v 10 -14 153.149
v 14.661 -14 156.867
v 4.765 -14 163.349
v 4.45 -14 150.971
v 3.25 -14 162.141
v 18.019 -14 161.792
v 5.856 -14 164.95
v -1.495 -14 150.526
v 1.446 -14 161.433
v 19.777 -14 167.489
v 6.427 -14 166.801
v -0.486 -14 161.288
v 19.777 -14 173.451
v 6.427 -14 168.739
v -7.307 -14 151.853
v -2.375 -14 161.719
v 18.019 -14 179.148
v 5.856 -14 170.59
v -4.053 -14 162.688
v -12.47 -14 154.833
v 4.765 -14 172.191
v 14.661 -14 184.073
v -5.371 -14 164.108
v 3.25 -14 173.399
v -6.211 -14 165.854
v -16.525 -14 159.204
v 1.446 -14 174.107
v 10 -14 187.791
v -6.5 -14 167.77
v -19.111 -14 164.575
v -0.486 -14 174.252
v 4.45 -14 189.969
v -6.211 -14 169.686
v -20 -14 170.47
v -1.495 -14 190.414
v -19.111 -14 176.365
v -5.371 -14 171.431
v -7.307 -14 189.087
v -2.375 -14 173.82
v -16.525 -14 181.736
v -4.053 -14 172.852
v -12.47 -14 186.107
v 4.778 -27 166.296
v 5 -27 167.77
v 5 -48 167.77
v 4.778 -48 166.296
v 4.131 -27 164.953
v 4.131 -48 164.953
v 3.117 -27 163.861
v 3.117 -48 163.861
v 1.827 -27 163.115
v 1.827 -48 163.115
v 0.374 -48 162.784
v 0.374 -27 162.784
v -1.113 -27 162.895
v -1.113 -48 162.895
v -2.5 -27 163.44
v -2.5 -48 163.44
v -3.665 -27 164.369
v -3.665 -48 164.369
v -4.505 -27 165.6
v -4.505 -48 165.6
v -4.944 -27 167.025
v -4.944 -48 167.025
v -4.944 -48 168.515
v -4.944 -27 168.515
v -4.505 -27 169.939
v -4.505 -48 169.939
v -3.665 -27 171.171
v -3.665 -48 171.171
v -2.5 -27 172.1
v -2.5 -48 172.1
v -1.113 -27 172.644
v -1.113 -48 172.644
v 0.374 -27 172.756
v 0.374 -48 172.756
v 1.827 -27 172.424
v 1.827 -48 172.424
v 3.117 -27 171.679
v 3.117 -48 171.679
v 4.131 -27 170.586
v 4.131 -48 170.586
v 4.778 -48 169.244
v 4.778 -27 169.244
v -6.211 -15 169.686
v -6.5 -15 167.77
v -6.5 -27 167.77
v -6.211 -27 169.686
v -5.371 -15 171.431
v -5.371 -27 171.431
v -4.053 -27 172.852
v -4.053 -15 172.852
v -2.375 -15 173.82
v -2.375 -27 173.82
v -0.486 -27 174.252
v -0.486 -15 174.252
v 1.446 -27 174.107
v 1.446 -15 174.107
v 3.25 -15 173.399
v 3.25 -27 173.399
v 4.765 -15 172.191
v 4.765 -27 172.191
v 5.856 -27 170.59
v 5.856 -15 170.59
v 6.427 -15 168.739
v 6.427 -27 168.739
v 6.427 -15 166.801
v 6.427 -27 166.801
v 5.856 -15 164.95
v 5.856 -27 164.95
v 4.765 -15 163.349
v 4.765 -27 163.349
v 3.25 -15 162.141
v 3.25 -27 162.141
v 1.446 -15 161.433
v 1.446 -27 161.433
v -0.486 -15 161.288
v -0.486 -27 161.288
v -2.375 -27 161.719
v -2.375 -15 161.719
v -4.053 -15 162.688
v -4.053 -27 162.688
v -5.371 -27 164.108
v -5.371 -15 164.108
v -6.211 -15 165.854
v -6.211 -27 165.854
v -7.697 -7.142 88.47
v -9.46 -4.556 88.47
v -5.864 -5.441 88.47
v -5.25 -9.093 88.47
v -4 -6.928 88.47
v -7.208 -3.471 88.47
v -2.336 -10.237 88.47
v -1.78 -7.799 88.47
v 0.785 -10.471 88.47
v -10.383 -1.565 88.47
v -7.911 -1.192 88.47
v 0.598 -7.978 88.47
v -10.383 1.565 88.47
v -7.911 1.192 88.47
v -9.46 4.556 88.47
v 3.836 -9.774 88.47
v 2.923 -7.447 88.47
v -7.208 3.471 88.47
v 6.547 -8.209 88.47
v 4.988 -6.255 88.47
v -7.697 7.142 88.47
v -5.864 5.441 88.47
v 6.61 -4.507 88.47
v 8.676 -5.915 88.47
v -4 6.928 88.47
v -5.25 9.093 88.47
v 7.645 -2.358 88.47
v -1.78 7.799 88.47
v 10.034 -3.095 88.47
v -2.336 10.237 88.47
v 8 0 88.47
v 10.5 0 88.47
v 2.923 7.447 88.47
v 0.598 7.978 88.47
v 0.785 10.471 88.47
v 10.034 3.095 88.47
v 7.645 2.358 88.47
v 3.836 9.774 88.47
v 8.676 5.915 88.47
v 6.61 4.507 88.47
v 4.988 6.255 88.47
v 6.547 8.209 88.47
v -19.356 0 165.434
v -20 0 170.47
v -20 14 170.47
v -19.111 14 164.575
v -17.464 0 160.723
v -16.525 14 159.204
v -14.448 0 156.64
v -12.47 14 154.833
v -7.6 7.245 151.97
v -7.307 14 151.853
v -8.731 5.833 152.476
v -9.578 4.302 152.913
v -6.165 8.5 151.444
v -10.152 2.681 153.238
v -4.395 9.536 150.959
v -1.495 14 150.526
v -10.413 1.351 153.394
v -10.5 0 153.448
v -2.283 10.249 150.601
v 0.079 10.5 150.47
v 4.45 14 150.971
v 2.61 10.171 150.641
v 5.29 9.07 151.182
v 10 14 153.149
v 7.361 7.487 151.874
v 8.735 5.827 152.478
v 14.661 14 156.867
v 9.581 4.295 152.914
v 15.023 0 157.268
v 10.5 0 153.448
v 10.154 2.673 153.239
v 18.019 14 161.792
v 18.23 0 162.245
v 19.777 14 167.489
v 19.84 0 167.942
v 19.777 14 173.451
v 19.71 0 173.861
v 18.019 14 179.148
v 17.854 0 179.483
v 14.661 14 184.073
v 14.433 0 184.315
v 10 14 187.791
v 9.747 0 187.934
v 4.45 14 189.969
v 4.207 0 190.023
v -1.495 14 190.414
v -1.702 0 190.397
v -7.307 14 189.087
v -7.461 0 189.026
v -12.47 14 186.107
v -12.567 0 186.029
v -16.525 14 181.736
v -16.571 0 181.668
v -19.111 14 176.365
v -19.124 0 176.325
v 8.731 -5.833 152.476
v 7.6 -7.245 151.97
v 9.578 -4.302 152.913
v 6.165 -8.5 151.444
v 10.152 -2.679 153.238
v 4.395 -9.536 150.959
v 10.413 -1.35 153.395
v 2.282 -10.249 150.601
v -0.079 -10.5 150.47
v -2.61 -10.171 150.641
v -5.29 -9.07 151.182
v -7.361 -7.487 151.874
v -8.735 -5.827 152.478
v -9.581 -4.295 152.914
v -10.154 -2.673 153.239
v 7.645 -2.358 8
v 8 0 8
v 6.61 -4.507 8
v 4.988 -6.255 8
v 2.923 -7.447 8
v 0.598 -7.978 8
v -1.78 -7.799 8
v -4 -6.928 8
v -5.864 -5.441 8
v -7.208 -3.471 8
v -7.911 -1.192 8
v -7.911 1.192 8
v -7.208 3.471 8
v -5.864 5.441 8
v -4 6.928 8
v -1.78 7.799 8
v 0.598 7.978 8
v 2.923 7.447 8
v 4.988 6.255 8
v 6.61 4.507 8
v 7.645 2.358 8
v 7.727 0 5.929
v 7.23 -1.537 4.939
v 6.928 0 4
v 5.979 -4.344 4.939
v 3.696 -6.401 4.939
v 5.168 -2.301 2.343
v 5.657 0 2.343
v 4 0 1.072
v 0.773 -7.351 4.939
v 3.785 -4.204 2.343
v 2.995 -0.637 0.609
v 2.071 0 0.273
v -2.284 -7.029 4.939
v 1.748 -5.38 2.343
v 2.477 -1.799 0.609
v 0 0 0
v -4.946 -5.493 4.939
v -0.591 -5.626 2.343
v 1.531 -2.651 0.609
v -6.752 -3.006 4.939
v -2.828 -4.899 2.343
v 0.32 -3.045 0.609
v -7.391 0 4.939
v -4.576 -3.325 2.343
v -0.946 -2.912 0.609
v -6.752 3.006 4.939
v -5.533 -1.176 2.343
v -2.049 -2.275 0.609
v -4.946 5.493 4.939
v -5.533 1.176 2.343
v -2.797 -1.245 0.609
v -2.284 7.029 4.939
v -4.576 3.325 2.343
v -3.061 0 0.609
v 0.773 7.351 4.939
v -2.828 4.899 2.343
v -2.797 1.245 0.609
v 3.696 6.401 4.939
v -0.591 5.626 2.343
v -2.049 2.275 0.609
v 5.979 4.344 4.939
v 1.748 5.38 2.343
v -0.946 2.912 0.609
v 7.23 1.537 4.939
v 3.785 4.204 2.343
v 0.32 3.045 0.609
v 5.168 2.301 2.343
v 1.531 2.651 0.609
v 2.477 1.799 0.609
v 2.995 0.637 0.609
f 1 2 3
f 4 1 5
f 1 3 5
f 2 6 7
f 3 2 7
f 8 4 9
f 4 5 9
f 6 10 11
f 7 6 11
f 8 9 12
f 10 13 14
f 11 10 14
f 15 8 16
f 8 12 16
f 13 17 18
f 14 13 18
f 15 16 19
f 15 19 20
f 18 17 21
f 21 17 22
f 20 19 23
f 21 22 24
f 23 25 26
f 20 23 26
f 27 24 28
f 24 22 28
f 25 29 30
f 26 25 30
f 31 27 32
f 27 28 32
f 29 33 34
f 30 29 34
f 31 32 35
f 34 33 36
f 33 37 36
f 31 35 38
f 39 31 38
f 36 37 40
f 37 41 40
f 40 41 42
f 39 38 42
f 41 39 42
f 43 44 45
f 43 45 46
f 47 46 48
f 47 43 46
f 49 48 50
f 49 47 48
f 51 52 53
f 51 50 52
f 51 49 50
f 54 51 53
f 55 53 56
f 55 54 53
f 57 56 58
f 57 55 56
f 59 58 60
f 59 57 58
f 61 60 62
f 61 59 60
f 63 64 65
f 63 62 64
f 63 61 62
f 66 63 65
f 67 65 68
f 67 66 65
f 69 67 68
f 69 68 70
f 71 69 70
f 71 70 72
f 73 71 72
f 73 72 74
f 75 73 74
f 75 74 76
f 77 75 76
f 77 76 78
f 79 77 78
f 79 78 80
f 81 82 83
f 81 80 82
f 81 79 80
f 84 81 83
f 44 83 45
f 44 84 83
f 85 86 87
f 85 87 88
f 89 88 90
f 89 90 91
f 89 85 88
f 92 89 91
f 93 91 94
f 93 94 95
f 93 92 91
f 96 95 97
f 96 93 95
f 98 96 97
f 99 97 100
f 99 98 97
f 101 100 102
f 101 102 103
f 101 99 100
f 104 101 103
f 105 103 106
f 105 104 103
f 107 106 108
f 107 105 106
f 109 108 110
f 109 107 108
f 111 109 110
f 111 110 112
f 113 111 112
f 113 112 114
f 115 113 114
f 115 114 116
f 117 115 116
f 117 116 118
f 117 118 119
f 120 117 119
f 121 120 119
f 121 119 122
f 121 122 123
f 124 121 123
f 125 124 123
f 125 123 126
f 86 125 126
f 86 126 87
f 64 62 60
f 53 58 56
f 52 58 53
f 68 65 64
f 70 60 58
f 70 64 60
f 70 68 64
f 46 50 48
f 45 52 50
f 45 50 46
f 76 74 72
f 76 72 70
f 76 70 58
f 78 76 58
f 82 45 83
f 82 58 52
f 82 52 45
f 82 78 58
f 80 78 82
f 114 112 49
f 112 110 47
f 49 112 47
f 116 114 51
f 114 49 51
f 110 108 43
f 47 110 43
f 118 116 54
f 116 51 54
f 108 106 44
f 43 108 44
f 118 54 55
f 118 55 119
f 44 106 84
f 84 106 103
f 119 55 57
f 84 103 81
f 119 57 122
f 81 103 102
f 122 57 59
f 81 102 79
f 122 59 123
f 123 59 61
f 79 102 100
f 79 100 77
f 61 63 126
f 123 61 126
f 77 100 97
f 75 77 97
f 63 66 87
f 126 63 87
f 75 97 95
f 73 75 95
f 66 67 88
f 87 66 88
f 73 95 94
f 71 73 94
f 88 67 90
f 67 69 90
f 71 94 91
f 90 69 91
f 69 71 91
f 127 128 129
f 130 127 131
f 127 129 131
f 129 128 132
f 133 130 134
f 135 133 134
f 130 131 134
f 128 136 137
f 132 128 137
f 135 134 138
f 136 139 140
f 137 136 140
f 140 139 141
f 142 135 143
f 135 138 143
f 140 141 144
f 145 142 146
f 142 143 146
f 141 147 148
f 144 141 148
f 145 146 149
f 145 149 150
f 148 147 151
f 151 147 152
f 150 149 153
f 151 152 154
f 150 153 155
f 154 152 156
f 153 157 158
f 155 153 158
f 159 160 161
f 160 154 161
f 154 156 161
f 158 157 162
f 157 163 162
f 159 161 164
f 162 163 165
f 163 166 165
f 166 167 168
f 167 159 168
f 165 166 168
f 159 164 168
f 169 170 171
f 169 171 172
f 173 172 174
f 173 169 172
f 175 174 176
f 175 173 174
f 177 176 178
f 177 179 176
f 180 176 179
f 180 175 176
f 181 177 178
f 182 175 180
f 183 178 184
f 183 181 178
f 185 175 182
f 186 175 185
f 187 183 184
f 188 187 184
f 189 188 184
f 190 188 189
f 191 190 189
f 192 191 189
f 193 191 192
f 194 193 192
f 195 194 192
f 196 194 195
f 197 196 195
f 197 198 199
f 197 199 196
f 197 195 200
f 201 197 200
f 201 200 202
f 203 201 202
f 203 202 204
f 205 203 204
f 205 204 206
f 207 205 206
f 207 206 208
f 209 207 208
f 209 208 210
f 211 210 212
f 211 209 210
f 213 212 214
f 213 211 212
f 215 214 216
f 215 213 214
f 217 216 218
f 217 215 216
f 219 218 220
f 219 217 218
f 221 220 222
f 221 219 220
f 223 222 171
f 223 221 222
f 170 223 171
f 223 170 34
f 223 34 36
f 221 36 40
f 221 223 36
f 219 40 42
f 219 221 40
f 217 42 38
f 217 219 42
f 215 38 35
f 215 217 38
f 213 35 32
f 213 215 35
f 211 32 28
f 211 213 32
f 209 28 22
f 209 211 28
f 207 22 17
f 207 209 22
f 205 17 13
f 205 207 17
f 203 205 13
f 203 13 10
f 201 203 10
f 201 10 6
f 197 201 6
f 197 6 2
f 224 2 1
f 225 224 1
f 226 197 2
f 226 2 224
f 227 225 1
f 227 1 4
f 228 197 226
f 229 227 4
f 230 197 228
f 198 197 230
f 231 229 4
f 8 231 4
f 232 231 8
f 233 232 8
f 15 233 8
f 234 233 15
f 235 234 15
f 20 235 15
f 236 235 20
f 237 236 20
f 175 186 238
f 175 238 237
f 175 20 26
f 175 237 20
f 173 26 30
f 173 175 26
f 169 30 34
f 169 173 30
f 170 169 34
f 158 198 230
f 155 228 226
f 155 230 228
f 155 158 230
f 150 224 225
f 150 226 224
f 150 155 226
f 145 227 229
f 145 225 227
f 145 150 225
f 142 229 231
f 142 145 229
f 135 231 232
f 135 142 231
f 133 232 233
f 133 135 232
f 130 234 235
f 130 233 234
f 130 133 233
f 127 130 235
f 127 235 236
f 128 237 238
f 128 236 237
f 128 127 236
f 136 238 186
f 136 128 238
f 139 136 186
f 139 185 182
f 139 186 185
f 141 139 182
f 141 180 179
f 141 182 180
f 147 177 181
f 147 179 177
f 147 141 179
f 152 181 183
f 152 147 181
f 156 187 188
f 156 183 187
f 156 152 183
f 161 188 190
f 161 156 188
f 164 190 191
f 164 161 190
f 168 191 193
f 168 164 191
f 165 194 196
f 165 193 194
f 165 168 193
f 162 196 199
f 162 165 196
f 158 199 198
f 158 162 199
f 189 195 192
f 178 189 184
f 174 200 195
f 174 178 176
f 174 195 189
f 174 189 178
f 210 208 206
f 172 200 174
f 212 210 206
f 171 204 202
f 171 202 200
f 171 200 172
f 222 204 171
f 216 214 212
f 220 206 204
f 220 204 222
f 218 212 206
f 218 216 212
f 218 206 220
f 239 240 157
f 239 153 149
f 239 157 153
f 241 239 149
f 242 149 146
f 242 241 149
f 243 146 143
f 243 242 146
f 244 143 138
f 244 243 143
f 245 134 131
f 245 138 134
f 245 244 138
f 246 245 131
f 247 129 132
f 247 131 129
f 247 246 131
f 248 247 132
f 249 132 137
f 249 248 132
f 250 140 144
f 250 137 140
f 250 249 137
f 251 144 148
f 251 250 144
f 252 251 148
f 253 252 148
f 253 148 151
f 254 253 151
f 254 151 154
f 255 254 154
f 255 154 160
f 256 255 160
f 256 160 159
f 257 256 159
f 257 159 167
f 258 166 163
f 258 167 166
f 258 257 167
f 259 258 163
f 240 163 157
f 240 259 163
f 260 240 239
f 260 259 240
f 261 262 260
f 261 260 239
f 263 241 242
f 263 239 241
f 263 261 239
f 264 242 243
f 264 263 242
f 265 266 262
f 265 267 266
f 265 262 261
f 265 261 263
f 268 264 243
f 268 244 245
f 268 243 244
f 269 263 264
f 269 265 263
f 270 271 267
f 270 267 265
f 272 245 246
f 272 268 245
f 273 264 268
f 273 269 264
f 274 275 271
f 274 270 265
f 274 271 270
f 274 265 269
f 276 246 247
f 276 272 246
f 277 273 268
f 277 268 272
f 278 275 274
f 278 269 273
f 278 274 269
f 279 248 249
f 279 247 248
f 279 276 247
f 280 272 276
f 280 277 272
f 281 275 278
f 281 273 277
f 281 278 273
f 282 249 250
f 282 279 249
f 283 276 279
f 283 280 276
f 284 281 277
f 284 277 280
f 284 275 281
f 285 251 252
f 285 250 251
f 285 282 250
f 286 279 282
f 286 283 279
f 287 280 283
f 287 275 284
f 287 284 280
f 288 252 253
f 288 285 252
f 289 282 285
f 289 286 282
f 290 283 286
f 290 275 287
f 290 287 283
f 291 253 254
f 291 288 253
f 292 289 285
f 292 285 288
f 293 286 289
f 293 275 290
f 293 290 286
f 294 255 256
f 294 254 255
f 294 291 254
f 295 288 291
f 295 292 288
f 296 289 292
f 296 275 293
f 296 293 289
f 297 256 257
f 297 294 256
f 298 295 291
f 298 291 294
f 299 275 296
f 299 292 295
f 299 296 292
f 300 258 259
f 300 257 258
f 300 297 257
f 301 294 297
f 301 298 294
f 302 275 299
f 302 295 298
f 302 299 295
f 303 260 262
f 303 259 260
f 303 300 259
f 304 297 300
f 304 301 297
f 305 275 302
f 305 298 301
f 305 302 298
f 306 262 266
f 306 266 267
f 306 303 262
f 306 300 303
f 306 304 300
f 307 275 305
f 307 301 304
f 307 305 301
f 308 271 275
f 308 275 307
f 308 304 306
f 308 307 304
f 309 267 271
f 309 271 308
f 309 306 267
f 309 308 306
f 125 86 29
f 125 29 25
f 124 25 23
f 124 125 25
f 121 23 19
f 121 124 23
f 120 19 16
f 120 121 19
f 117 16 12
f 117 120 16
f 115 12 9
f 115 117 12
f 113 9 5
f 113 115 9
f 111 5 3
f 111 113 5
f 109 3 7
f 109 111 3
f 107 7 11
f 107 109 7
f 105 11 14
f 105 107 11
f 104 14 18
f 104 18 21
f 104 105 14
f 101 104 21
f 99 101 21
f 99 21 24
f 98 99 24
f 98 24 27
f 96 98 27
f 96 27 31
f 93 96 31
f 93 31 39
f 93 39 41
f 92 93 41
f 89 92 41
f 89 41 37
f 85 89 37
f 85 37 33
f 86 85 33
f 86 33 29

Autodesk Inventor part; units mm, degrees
ref_plane "YZ Plane" through (0, 0, 0) normal (1, 0, 0) x (0, 1, 0)
sketch "スケッチ1" plane through (0, 0, 0) normal (0, 0, 1) x (1, 0, 0)
  circle A0 centre (0, 0) radius 8
  dimension "d0" = 16
extrude "押し出し1" add sketch "スケッチ1" along normal blind 88.47
sketch "スケッチ2" plane through (0, 0, 0) normal (0, 0, -1) x (-1, 0, 0)
  point P0 (0, 0)
  point P1 (0, 0)
sketch "スケッチ3" plane through (0, 0, 88.47) normal (0, 0, 1) x (1, 0, 0)
  circle A0 centre (0, 0) radius 10.5
  dimension "d4" = 21
extrude "押し出し2" add sketch "スケッチ3" along normal blind 82
fillet "フィレット1" radius 8 1 edges at (-8, 0, 0)
sketch "スケッチ4" plane through (0, 0, 0) normal (0, 1, 0) x (-1, 0, 0)
  circle A0 centre (0, 170.47) radius 20
  line L0 (10.5, 170.47) -> (-10.5, 170.47) projected
  point P0 (0, 0)
  dimension "d7" = 40
  dimension "d25" = 0
extrude "押し出し3" add sketch "スケッチ4" along normal mid plane 28
ref_plane "作業平面1" through (0, 0, 148.47) normal (0, 0, -1) x (-1, 0, 0)
sketch "スケッチ5" plane through (0, 0, 148.47) normal (0, 0, -1) x (-1, 0, 0)
  line L0 (10.5, 15) -> (-10.5, 15)
  line L1 (-10.5, 15) -> (-10.5, -15)
  line L2 (-10.5, -15) -> (10.5, -15)
  line L3 (10.5, -15) -> (10.5, 15)
  line L4 (10.5, 15) -> (-10.5, -15) construction
  line L5 (-10.5, 15) -> (10.5, -15) construction
  point P0 (0, 0)
  dimension "d11" = 21
  dimension "d12" = 30
ref_plane "作業平面2" through (10.5, -15, 148.47) normal (0, 1, 0) x (-1, 0, 0)
sketch "スケッチ8" plane through (10.5, -15, 148.47) normal (0, 1, 0) x (-1, 0, 0)
  circle A0 centre (10.5, 19.2998) radius 6.5
  point P0 (10.5, -148.47)
  dimension "d14" = 13
extrude "押し出し4" add sketch "スケッチ8" along normal mid plane 24
sketch "スケッチ9" plane through (0, -27, 167.7698) normal (0, -1, 0) x (1, 0, 0)
  circle A0 centre (0, 0) radius 5
  point P0 (0, -167.7698)
  dimension "d17" = 10
extrude "押し出し5" add sketch "スケッチ9" along normal blind 21
sketch "スケッチ11" plane through (0, 0, 0) normal (0, 0, 1) x (1, 0, 0)
  line L0 (-25, -25) -> (25, -25)
  line L1 (25, -25) -> (25, 25)
  line L2 (25, 25) -> (-25, 25)
  line L3 (-25, 25) -> (-25, -25)
  line L4 (-25, -25) -> (25, 25) construction
  line L5 (25, -25) -> (-25, 25) construction
  point P0 (0, 0)
  dimension "d23" = 50
  dimension "d24" = 50
properties part number "ラックアンドピニオンの左右の棒"
